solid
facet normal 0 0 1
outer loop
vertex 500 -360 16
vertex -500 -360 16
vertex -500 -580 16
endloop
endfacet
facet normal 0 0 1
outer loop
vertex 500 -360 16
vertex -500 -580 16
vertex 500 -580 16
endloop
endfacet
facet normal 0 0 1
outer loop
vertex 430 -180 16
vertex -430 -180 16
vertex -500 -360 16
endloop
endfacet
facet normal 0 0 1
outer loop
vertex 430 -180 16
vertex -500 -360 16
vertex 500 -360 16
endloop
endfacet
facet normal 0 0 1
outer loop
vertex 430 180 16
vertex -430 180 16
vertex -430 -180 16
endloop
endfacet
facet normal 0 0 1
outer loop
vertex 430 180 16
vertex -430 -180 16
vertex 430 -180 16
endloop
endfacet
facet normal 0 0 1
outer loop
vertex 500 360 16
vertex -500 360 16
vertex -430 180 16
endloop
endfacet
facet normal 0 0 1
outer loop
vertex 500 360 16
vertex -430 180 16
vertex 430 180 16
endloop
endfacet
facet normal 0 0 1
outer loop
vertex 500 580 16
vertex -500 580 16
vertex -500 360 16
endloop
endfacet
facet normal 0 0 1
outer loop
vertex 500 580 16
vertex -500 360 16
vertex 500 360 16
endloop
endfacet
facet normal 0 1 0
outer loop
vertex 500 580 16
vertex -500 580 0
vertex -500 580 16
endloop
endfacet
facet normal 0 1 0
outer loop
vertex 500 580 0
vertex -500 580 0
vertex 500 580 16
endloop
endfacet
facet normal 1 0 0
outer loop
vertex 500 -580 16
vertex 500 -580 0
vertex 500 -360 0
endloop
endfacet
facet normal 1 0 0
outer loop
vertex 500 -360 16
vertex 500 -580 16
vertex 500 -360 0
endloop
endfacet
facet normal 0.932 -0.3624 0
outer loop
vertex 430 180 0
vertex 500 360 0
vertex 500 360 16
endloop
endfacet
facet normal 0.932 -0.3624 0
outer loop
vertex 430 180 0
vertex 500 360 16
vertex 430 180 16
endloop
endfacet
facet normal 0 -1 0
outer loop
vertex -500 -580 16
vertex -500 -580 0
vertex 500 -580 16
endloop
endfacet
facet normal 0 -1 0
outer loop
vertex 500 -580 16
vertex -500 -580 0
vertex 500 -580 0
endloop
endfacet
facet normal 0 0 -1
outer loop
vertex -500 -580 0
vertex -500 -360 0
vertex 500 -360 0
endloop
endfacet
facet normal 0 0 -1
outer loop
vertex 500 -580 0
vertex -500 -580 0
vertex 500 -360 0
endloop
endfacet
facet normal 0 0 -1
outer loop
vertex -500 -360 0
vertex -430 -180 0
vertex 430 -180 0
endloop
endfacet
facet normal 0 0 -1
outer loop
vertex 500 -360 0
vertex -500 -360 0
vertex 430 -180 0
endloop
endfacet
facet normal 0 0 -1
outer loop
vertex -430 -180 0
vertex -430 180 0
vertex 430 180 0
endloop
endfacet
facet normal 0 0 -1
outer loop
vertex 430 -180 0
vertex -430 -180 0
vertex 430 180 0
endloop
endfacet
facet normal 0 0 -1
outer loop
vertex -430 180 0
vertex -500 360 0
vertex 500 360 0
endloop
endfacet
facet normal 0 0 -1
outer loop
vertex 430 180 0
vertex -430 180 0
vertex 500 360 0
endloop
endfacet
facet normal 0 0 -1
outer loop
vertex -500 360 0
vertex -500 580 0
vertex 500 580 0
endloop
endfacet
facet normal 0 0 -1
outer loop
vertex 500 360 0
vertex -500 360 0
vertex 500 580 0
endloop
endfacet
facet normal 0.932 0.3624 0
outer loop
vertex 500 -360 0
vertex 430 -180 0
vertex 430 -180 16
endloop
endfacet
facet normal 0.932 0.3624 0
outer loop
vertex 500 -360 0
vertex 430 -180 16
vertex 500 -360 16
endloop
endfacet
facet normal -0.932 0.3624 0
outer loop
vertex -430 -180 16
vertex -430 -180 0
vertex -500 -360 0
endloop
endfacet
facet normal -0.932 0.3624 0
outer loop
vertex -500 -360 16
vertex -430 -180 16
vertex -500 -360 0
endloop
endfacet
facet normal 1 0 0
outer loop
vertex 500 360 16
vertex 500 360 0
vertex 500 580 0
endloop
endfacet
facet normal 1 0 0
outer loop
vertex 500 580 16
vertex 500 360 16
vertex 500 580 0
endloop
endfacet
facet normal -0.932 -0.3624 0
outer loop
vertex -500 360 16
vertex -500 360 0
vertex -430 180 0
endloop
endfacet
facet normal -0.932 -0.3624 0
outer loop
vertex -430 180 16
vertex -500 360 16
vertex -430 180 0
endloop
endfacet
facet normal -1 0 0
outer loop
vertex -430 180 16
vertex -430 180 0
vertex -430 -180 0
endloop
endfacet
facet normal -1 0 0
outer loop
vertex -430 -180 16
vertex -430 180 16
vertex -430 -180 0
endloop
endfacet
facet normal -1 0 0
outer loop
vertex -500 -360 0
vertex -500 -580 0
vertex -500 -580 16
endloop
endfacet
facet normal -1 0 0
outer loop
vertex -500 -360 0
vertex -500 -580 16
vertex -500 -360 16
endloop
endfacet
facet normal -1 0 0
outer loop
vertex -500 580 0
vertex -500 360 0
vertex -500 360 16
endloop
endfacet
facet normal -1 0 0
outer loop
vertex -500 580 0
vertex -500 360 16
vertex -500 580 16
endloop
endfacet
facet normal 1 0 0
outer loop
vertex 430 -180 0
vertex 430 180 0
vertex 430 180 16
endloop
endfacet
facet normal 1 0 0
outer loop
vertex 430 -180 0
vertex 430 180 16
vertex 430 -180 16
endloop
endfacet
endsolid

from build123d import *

# Parameters (mm, degrees)
SKETCH_2_W          = 1000
SKETCH_2_H          = 1160
EXTRUDE_1_DEPTH     = 16
CUT_EXTRUDE_1_DEPTH = 766.934723067


with BuildPart() as part:
    # 草图2 → 凸台-拉伸1 (new body)
    with BuildSketch(Plane.XY):
        Rectangle(SKETCH_2_W, SKETCH_2_H)
    extrude(amount=EXTRUDE_1_DEPTH)

    # 草图4 → 切除-拉伸1 (cut, through all)
    with BuildSketch(Plane(origin=(0, 0, 0), x_dir=(-1, 0, 0), z_dir=(0, 0, -1))):
        Polygon((-500, 360), (-430, 180), (-430, -180), (-500, -360), align=None)
        Polygon((430, 180), (430, -180), (500, -360), (500, 360), align=None)
    extrude(amount=-CUT_EXTRUDE_1_DEPTH, mode=Mode.SUBTRACT)


solid = part.part
